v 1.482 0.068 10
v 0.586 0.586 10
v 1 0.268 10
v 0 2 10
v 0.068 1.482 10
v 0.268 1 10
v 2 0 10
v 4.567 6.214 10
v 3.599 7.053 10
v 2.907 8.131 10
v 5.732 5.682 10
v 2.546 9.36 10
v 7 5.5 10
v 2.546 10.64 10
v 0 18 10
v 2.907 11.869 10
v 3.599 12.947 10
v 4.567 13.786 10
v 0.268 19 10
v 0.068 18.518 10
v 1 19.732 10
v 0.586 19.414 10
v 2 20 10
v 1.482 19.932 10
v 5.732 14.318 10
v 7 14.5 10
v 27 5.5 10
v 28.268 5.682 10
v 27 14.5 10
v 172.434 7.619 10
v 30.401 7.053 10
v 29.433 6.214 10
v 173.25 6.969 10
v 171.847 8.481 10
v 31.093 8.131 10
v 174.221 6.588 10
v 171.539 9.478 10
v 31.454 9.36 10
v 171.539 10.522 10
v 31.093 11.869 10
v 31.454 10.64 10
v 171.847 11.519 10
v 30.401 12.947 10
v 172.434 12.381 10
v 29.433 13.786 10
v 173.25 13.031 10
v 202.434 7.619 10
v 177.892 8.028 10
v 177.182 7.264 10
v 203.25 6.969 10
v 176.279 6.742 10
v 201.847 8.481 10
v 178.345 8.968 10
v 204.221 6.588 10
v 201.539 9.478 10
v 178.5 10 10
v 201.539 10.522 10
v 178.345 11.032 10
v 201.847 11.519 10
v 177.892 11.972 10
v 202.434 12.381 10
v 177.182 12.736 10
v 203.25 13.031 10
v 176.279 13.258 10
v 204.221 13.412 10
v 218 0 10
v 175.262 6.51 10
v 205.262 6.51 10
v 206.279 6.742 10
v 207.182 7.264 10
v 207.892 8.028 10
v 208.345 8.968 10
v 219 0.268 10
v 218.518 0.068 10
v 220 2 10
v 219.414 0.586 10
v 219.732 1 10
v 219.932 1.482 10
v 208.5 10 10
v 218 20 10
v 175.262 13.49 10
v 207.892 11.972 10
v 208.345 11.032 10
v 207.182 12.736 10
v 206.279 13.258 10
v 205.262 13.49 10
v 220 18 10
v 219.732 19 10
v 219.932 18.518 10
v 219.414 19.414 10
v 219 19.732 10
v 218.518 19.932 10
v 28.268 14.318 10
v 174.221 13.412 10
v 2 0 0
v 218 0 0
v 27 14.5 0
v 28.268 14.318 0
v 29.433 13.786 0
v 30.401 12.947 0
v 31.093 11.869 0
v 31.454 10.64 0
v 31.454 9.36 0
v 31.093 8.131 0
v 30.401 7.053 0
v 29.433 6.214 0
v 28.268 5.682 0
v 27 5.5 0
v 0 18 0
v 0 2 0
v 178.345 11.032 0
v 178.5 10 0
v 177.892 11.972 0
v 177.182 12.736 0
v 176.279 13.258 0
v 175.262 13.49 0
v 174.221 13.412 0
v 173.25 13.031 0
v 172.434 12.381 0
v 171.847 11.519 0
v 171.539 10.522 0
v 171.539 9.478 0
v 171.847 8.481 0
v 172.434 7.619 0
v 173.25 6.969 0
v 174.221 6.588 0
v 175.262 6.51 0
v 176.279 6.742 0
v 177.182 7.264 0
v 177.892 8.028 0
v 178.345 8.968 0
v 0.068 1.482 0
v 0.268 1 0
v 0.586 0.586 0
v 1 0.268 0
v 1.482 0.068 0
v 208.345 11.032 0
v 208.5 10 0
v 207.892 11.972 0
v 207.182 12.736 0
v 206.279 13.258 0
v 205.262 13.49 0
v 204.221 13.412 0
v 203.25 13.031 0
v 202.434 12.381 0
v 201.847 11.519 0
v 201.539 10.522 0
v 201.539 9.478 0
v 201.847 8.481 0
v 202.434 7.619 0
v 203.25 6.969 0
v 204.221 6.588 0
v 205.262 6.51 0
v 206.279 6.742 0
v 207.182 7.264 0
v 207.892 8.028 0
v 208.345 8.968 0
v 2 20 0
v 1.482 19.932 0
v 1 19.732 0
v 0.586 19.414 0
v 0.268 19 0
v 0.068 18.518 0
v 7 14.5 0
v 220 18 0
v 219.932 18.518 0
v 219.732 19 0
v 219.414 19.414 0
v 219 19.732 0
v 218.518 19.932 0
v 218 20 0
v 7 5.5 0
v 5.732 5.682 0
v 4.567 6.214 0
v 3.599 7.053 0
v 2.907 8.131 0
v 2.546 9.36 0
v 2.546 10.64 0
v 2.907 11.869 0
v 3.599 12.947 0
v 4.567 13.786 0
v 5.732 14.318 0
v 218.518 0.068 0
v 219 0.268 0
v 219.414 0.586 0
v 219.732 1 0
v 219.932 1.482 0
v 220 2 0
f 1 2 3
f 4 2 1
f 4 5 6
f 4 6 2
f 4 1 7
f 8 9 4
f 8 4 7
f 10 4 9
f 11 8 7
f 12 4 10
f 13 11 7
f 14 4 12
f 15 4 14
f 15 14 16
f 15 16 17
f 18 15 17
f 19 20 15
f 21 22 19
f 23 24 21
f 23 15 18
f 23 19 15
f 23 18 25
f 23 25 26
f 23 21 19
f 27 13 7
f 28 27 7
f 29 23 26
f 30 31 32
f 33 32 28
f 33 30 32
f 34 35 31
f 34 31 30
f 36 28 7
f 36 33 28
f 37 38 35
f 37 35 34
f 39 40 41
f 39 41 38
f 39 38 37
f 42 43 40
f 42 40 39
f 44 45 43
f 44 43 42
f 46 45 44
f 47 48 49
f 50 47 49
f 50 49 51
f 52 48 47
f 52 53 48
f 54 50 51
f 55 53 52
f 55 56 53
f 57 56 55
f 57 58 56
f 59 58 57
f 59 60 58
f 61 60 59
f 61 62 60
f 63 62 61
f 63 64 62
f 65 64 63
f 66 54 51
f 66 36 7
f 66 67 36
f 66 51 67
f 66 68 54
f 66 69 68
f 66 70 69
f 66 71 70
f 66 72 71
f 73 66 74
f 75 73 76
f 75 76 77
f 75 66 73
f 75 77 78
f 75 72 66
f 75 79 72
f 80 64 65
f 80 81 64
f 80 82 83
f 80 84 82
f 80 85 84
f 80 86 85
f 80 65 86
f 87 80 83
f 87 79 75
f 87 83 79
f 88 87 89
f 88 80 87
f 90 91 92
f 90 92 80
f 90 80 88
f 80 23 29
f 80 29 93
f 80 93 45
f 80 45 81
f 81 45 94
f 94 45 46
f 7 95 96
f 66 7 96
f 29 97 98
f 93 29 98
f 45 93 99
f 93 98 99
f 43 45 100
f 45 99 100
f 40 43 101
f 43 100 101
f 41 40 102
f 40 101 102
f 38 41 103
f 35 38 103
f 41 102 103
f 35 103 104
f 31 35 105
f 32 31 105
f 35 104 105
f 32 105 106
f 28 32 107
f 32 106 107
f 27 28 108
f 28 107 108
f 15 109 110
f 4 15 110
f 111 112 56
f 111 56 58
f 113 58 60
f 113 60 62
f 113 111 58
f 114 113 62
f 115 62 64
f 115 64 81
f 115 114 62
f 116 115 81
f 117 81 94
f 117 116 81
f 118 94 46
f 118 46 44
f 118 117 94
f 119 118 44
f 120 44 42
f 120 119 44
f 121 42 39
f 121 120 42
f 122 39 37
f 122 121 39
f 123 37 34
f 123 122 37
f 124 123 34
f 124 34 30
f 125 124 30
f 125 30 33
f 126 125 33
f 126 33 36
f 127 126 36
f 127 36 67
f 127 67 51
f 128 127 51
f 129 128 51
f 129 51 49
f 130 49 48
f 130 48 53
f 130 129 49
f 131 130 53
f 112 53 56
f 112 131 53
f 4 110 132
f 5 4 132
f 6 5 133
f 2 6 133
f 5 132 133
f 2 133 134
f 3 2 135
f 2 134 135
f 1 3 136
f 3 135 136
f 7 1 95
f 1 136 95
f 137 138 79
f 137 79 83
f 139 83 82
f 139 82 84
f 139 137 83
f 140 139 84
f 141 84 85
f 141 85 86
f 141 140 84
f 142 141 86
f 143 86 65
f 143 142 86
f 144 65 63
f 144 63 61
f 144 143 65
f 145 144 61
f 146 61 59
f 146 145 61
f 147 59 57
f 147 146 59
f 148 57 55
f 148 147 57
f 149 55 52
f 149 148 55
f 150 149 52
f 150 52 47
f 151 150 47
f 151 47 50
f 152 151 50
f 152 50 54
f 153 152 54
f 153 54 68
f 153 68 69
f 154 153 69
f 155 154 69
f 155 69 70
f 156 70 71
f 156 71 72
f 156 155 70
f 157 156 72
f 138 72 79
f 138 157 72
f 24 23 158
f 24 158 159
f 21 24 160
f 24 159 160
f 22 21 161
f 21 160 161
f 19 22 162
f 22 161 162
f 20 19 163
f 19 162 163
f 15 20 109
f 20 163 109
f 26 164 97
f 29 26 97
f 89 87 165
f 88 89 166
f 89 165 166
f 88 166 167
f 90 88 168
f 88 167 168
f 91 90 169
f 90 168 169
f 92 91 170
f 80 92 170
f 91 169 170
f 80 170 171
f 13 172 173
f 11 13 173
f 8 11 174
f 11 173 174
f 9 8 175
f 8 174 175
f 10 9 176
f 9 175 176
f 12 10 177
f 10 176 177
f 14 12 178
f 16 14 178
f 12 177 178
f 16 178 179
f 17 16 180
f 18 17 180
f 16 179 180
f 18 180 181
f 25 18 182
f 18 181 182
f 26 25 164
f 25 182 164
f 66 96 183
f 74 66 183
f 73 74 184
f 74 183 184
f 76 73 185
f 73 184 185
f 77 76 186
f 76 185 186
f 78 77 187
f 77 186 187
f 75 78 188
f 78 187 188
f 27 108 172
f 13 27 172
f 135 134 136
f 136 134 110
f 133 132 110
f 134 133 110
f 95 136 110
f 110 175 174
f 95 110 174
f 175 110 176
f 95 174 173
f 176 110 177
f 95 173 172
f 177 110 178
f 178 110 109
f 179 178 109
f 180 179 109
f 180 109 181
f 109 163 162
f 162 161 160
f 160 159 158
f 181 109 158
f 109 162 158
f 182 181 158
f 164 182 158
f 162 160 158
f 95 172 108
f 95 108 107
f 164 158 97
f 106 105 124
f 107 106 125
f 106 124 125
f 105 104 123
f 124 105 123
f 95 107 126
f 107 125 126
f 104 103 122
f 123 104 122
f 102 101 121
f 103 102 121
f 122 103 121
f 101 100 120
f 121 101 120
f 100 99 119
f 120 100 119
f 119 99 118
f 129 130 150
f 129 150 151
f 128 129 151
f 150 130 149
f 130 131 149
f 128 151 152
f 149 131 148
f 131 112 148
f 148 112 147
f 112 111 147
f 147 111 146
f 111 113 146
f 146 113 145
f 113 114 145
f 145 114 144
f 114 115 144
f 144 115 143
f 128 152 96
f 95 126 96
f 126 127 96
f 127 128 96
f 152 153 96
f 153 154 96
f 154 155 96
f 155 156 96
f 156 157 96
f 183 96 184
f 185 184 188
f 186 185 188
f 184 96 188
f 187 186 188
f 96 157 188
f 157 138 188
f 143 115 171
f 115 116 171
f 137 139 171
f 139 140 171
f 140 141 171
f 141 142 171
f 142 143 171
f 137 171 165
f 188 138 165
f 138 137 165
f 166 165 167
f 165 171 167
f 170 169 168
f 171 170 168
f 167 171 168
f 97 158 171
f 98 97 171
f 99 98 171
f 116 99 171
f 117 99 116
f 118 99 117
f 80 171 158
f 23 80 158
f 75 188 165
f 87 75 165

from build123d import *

# Parameters (mm, degrees)
F0_R     = 3.5
F1_DEPTH = 10


with BuildPart() as f1:
    # F0 (on Top) → F1 (new body)
    with BuildSketch(Plane.XY):
        with BuildLine():
            ThreePointArc((0, 2), (0.585786, 0.585786), (2, 0))
            Line((2, 0), (218, 0))
            ThreePointArc((218, 0), (219.414214, 0.585786), (220, 2))
            Line((220, 2), (220, 18))
            ThreePointArc((220, 18), (219.414214, 19.414214), (218, 20))
            Line((218, 20), (2, 20))
            ThreePointArc((2, 20), (0.585786, 19.414214), (0, 18))
            Line((0, 18), (0, 2))
        make_face()
        with BuildLine():
            ThreePointArc((7, 5.5), (2.5, 10), (7, 14.5))
            Line((7, 14.5), (27, 14.5))
            ThreePointArc((27, 14.5), (31.5, 10), (27, 5.5))
            Line((27, 5.5), (7, 5.5))
        make_face(mode=Mode.SUBTRACT)
        with Locations((175, 10)):
            Circle(F0_R, mode=Mode.SUBTRACT)
        with Locations((205, 10)):
            Circle(F0_R, mode=Mode.SUBTRACT)
    extrude(amount=F1_DEPTH)


solid = f1.part
